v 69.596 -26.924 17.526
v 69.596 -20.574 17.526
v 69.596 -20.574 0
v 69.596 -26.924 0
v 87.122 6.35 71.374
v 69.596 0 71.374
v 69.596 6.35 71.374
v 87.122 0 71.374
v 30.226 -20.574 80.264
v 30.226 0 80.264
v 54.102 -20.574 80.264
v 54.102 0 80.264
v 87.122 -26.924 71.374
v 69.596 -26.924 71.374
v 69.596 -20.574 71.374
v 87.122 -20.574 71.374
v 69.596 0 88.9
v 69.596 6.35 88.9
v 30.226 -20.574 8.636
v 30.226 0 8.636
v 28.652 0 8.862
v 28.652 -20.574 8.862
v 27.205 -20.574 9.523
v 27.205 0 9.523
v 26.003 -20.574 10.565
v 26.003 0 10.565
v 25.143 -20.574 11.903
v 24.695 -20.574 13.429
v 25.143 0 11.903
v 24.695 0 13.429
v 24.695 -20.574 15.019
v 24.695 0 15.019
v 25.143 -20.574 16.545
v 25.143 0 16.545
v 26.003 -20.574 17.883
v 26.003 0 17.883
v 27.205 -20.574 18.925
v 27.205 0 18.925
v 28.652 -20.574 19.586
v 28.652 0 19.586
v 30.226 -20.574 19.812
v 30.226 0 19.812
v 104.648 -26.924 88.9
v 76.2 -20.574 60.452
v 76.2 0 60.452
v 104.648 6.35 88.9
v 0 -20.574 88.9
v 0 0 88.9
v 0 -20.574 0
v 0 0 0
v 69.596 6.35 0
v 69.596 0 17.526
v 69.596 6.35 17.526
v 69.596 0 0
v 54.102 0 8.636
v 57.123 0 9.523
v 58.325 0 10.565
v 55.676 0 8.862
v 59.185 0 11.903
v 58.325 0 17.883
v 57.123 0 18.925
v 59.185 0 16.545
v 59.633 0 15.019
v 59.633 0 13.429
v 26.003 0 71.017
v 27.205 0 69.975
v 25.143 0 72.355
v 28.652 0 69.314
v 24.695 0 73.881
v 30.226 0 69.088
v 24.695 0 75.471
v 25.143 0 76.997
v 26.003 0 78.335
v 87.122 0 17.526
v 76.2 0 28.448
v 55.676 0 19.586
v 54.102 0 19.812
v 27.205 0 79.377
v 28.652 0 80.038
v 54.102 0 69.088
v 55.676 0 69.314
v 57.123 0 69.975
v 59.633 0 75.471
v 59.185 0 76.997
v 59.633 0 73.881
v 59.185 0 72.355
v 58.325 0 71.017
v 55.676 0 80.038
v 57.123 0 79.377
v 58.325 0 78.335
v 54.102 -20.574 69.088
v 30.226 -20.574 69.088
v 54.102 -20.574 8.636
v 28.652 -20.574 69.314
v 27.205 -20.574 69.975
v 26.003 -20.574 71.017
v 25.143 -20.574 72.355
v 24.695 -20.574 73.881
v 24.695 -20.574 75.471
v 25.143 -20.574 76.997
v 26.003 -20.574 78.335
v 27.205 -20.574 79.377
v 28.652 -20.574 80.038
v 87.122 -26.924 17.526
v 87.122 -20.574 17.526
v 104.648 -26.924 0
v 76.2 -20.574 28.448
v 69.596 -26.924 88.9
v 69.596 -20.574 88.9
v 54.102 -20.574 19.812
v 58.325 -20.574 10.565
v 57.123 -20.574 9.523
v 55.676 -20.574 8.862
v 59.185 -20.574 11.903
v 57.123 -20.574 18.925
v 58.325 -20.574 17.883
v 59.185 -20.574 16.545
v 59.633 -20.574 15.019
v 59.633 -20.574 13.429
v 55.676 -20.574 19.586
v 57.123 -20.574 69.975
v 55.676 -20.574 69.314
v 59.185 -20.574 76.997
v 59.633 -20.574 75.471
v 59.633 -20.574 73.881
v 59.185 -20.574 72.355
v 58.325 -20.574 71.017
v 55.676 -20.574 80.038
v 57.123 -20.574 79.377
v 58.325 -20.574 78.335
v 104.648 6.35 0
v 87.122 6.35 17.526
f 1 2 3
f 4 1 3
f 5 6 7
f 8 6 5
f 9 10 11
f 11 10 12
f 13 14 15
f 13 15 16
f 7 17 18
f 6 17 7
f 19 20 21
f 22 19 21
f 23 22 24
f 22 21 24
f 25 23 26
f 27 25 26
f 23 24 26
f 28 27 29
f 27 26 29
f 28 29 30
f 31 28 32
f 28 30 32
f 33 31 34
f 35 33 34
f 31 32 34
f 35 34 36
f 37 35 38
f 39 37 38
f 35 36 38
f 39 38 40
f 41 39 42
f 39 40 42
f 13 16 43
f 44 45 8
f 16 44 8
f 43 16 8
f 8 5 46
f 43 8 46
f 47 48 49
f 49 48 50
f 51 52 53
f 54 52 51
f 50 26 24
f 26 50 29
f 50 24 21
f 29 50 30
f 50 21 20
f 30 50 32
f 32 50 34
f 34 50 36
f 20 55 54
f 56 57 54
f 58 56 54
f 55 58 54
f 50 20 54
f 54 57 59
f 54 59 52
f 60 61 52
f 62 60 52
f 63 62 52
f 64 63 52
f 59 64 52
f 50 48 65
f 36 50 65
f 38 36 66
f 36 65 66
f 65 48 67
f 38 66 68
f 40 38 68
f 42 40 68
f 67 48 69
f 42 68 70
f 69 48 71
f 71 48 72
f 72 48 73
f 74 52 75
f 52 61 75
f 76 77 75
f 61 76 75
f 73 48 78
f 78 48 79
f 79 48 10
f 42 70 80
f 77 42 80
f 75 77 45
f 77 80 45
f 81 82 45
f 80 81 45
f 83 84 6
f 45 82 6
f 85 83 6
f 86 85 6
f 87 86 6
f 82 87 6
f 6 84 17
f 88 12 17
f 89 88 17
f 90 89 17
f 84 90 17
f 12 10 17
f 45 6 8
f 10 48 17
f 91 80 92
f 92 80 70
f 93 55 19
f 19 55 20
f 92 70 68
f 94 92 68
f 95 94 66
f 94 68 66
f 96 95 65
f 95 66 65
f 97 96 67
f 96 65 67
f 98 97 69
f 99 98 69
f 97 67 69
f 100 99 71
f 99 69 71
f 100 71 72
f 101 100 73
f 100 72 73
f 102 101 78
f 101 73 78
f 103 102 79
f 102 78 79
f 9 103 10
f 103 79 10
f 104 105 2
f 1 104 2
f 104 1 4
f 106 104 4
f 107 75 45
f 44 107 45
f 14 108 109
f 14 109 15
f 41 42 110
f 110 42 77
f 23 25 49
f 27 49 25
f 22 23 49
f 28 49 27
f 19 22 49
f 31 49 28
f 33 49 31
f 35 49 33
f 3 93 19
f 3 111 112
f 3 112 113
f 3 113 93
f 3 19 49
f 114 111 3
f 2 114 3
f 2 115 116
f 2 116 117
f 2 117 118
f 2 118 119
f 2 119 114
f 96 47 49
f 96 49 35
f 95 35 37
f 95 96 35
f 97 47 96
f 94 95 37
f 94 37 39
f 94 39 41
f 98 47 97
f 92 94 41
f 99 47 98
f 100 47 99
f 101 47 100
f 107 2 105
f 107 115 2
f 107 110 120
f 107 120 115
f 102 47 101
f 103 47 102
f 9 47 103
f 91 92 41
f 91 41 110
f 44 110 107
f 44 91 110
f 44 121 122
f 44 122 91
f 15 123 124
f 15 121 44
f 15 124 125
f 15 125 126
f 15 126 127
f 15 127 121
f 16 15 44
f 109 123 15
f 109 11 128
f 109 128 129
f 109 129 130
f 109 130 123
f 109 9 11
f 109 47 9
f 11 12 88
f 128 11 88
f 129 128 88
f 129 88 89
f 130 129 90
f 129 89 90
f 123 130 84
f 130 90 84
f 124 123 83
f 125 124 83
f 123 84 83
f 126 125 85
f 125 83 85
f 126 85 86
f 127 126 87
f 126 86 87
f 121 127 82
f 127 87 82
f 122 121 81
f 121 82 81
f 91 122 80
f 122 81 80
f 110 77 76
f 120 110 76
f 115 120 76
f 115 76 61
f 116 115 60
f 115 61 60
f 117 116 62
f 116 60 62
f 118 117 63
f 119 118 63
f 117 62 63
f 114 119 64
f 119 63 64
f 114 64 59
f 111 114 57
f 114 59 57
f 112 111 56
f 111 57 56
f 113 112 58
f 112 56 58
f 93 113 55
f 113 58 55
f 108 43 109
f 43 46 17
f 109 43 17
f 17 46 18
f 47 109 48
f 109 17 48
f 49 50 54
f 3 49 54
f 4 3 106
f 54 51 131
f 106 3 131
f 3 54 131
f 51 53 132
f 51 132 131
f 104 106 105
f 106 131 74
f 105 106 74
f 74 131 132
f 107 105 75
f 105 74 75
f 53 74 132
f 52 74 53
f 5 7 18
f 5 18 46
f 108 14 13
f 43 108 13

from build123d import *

# Parameters (mm, degrees)
F0_W     = 76.2
F0_H     = 16.002
F1_DEPTH = 20.574
F3_DEPTH = 20.574
F4_DEPTH = 6.35
F6_DEPTH = 33.274
F8_DEPTH = 33.274


with BuildPart() as f1:
    # F0 (on Front) → F1 (new body)
    with BuildSketch(Plane.XZ):
        Polygon((0, 28.448), (0, 0), (104.648, 0), (76.2, 28.448), align=None)
        with BuildLine():
            ThreePointArc((30.226, 8.636), (24.638, 14.224), (30.226, 19.812))
            Line((30.226, 19.812), (54.102, 19.812))
            ThreePointArc((54.102, 19.812), (59.69, 14.224), (54.102, 8.636))
            Line((54.102, 8.636), (30.226, 8.636))
        make_face(mode=Mode.SUBTRACT)
        with Locations((38.1, 36.449)):
            Rectangle(F0_W, F0_H)
        with Locations((38.1, 52.451)):
            Rectangle(F0_W, F0_H)
        Polygon((0, 88.9), (0, 60.452), (76.2, 60.452), (104.648, 88.9), align=None)
        with BuildLine():
            Line((54.102, 69.088), (30.226, 69.088))
            ThreePointArc((30.226, 69.088), (24.638, 74.676), (30.226, 80.264))
            Line((30.226, 80.264), (54.102, 80.264))
            ThreePointArc((54.102, 80.264), (59.69, 74.676), (54.102, 69.088))
        make_face(mode=Mode.SUBTRACT)
    extrude(amount=F1_DEPTH)

    # F0 (on Front) → F3 (join)
    with BuildSketch(Plane.XZ):
        Polygon((0, 28.448), (0, 0), (104.648, 0), (76.2, 28.448), align=None)
        with BuildLine():
            ThreePointArc((30.226, 8.636), (24.638, 14.224), (30.226, 19.812))
            Line((30.226, 19.812), (54.102, 19.812))
            ThreePointArc((54.102, 19.812), (59.69, 14.224), (54.102, 8.636))
            Line((54.102, 8.636), (30.226, 8.636))
        make_face(mode=Mode.SUBTRACT)
        with Locations((38.1, 36.449)):
            Rectangle(F0_W, F0_H)
        with Locations((38.1, 52.451)):
            Rectangle(F0_W, F0_H)
        Polygon((0, 88.9), (0, 60.452), (76.2, 60.452), (104.648, 88.9), align=None)
        with BuildLine():
            Line((54.102, 69.088), (30.226, 69.088))
            ThreePointArc((30.226, 69.088), (24.638, 74.676), (30.226, 80.264))
            Line((30.226, 80.264), (54.102, 80.264))
            ThreePointArc((54.102, 80.264), (59.69, 74.676), (54.102, 69.088))
        make_face(mode=Mode.SUBTRACT)
    extrude(amount=F3_DEPTH)

    # F2 (on face) → F4 (join, symmetric)
    with BuildSketch(Plane.XZ.offset(20.574)):
        Polygon((69.596, 17.526), (69.596, 0), (104.648, 0), (87.122, 17.526), align=None)
        Polygon((69.596, 88.9), (69.596, 71.374), (87.122, 71.374), (104.648, 88.9), align=None)
    extrude(amount=F4_DEPTH, both=True)

    # F5 (on face) → F6 (join)
    with BuildSketch(Plane.XZ.offset(26.924)):
        Polygon((87.122, 17.526), (69.596, 17.526), (69.596, 0), (104.648, 0), align=None)
    extrude(amount=-F6_DEPTH)

    # F7 (on face) → F8 (join)
    with BuildSketch(Plane.XZ.offset(26.924)):
        Polygon((104.648, 88.9), (69.596, 88.9), (69.596, 71.374), (87.122, 71.374), align=None)
    extrude(amount=-F8_DEPTH)


solid = f1.part
